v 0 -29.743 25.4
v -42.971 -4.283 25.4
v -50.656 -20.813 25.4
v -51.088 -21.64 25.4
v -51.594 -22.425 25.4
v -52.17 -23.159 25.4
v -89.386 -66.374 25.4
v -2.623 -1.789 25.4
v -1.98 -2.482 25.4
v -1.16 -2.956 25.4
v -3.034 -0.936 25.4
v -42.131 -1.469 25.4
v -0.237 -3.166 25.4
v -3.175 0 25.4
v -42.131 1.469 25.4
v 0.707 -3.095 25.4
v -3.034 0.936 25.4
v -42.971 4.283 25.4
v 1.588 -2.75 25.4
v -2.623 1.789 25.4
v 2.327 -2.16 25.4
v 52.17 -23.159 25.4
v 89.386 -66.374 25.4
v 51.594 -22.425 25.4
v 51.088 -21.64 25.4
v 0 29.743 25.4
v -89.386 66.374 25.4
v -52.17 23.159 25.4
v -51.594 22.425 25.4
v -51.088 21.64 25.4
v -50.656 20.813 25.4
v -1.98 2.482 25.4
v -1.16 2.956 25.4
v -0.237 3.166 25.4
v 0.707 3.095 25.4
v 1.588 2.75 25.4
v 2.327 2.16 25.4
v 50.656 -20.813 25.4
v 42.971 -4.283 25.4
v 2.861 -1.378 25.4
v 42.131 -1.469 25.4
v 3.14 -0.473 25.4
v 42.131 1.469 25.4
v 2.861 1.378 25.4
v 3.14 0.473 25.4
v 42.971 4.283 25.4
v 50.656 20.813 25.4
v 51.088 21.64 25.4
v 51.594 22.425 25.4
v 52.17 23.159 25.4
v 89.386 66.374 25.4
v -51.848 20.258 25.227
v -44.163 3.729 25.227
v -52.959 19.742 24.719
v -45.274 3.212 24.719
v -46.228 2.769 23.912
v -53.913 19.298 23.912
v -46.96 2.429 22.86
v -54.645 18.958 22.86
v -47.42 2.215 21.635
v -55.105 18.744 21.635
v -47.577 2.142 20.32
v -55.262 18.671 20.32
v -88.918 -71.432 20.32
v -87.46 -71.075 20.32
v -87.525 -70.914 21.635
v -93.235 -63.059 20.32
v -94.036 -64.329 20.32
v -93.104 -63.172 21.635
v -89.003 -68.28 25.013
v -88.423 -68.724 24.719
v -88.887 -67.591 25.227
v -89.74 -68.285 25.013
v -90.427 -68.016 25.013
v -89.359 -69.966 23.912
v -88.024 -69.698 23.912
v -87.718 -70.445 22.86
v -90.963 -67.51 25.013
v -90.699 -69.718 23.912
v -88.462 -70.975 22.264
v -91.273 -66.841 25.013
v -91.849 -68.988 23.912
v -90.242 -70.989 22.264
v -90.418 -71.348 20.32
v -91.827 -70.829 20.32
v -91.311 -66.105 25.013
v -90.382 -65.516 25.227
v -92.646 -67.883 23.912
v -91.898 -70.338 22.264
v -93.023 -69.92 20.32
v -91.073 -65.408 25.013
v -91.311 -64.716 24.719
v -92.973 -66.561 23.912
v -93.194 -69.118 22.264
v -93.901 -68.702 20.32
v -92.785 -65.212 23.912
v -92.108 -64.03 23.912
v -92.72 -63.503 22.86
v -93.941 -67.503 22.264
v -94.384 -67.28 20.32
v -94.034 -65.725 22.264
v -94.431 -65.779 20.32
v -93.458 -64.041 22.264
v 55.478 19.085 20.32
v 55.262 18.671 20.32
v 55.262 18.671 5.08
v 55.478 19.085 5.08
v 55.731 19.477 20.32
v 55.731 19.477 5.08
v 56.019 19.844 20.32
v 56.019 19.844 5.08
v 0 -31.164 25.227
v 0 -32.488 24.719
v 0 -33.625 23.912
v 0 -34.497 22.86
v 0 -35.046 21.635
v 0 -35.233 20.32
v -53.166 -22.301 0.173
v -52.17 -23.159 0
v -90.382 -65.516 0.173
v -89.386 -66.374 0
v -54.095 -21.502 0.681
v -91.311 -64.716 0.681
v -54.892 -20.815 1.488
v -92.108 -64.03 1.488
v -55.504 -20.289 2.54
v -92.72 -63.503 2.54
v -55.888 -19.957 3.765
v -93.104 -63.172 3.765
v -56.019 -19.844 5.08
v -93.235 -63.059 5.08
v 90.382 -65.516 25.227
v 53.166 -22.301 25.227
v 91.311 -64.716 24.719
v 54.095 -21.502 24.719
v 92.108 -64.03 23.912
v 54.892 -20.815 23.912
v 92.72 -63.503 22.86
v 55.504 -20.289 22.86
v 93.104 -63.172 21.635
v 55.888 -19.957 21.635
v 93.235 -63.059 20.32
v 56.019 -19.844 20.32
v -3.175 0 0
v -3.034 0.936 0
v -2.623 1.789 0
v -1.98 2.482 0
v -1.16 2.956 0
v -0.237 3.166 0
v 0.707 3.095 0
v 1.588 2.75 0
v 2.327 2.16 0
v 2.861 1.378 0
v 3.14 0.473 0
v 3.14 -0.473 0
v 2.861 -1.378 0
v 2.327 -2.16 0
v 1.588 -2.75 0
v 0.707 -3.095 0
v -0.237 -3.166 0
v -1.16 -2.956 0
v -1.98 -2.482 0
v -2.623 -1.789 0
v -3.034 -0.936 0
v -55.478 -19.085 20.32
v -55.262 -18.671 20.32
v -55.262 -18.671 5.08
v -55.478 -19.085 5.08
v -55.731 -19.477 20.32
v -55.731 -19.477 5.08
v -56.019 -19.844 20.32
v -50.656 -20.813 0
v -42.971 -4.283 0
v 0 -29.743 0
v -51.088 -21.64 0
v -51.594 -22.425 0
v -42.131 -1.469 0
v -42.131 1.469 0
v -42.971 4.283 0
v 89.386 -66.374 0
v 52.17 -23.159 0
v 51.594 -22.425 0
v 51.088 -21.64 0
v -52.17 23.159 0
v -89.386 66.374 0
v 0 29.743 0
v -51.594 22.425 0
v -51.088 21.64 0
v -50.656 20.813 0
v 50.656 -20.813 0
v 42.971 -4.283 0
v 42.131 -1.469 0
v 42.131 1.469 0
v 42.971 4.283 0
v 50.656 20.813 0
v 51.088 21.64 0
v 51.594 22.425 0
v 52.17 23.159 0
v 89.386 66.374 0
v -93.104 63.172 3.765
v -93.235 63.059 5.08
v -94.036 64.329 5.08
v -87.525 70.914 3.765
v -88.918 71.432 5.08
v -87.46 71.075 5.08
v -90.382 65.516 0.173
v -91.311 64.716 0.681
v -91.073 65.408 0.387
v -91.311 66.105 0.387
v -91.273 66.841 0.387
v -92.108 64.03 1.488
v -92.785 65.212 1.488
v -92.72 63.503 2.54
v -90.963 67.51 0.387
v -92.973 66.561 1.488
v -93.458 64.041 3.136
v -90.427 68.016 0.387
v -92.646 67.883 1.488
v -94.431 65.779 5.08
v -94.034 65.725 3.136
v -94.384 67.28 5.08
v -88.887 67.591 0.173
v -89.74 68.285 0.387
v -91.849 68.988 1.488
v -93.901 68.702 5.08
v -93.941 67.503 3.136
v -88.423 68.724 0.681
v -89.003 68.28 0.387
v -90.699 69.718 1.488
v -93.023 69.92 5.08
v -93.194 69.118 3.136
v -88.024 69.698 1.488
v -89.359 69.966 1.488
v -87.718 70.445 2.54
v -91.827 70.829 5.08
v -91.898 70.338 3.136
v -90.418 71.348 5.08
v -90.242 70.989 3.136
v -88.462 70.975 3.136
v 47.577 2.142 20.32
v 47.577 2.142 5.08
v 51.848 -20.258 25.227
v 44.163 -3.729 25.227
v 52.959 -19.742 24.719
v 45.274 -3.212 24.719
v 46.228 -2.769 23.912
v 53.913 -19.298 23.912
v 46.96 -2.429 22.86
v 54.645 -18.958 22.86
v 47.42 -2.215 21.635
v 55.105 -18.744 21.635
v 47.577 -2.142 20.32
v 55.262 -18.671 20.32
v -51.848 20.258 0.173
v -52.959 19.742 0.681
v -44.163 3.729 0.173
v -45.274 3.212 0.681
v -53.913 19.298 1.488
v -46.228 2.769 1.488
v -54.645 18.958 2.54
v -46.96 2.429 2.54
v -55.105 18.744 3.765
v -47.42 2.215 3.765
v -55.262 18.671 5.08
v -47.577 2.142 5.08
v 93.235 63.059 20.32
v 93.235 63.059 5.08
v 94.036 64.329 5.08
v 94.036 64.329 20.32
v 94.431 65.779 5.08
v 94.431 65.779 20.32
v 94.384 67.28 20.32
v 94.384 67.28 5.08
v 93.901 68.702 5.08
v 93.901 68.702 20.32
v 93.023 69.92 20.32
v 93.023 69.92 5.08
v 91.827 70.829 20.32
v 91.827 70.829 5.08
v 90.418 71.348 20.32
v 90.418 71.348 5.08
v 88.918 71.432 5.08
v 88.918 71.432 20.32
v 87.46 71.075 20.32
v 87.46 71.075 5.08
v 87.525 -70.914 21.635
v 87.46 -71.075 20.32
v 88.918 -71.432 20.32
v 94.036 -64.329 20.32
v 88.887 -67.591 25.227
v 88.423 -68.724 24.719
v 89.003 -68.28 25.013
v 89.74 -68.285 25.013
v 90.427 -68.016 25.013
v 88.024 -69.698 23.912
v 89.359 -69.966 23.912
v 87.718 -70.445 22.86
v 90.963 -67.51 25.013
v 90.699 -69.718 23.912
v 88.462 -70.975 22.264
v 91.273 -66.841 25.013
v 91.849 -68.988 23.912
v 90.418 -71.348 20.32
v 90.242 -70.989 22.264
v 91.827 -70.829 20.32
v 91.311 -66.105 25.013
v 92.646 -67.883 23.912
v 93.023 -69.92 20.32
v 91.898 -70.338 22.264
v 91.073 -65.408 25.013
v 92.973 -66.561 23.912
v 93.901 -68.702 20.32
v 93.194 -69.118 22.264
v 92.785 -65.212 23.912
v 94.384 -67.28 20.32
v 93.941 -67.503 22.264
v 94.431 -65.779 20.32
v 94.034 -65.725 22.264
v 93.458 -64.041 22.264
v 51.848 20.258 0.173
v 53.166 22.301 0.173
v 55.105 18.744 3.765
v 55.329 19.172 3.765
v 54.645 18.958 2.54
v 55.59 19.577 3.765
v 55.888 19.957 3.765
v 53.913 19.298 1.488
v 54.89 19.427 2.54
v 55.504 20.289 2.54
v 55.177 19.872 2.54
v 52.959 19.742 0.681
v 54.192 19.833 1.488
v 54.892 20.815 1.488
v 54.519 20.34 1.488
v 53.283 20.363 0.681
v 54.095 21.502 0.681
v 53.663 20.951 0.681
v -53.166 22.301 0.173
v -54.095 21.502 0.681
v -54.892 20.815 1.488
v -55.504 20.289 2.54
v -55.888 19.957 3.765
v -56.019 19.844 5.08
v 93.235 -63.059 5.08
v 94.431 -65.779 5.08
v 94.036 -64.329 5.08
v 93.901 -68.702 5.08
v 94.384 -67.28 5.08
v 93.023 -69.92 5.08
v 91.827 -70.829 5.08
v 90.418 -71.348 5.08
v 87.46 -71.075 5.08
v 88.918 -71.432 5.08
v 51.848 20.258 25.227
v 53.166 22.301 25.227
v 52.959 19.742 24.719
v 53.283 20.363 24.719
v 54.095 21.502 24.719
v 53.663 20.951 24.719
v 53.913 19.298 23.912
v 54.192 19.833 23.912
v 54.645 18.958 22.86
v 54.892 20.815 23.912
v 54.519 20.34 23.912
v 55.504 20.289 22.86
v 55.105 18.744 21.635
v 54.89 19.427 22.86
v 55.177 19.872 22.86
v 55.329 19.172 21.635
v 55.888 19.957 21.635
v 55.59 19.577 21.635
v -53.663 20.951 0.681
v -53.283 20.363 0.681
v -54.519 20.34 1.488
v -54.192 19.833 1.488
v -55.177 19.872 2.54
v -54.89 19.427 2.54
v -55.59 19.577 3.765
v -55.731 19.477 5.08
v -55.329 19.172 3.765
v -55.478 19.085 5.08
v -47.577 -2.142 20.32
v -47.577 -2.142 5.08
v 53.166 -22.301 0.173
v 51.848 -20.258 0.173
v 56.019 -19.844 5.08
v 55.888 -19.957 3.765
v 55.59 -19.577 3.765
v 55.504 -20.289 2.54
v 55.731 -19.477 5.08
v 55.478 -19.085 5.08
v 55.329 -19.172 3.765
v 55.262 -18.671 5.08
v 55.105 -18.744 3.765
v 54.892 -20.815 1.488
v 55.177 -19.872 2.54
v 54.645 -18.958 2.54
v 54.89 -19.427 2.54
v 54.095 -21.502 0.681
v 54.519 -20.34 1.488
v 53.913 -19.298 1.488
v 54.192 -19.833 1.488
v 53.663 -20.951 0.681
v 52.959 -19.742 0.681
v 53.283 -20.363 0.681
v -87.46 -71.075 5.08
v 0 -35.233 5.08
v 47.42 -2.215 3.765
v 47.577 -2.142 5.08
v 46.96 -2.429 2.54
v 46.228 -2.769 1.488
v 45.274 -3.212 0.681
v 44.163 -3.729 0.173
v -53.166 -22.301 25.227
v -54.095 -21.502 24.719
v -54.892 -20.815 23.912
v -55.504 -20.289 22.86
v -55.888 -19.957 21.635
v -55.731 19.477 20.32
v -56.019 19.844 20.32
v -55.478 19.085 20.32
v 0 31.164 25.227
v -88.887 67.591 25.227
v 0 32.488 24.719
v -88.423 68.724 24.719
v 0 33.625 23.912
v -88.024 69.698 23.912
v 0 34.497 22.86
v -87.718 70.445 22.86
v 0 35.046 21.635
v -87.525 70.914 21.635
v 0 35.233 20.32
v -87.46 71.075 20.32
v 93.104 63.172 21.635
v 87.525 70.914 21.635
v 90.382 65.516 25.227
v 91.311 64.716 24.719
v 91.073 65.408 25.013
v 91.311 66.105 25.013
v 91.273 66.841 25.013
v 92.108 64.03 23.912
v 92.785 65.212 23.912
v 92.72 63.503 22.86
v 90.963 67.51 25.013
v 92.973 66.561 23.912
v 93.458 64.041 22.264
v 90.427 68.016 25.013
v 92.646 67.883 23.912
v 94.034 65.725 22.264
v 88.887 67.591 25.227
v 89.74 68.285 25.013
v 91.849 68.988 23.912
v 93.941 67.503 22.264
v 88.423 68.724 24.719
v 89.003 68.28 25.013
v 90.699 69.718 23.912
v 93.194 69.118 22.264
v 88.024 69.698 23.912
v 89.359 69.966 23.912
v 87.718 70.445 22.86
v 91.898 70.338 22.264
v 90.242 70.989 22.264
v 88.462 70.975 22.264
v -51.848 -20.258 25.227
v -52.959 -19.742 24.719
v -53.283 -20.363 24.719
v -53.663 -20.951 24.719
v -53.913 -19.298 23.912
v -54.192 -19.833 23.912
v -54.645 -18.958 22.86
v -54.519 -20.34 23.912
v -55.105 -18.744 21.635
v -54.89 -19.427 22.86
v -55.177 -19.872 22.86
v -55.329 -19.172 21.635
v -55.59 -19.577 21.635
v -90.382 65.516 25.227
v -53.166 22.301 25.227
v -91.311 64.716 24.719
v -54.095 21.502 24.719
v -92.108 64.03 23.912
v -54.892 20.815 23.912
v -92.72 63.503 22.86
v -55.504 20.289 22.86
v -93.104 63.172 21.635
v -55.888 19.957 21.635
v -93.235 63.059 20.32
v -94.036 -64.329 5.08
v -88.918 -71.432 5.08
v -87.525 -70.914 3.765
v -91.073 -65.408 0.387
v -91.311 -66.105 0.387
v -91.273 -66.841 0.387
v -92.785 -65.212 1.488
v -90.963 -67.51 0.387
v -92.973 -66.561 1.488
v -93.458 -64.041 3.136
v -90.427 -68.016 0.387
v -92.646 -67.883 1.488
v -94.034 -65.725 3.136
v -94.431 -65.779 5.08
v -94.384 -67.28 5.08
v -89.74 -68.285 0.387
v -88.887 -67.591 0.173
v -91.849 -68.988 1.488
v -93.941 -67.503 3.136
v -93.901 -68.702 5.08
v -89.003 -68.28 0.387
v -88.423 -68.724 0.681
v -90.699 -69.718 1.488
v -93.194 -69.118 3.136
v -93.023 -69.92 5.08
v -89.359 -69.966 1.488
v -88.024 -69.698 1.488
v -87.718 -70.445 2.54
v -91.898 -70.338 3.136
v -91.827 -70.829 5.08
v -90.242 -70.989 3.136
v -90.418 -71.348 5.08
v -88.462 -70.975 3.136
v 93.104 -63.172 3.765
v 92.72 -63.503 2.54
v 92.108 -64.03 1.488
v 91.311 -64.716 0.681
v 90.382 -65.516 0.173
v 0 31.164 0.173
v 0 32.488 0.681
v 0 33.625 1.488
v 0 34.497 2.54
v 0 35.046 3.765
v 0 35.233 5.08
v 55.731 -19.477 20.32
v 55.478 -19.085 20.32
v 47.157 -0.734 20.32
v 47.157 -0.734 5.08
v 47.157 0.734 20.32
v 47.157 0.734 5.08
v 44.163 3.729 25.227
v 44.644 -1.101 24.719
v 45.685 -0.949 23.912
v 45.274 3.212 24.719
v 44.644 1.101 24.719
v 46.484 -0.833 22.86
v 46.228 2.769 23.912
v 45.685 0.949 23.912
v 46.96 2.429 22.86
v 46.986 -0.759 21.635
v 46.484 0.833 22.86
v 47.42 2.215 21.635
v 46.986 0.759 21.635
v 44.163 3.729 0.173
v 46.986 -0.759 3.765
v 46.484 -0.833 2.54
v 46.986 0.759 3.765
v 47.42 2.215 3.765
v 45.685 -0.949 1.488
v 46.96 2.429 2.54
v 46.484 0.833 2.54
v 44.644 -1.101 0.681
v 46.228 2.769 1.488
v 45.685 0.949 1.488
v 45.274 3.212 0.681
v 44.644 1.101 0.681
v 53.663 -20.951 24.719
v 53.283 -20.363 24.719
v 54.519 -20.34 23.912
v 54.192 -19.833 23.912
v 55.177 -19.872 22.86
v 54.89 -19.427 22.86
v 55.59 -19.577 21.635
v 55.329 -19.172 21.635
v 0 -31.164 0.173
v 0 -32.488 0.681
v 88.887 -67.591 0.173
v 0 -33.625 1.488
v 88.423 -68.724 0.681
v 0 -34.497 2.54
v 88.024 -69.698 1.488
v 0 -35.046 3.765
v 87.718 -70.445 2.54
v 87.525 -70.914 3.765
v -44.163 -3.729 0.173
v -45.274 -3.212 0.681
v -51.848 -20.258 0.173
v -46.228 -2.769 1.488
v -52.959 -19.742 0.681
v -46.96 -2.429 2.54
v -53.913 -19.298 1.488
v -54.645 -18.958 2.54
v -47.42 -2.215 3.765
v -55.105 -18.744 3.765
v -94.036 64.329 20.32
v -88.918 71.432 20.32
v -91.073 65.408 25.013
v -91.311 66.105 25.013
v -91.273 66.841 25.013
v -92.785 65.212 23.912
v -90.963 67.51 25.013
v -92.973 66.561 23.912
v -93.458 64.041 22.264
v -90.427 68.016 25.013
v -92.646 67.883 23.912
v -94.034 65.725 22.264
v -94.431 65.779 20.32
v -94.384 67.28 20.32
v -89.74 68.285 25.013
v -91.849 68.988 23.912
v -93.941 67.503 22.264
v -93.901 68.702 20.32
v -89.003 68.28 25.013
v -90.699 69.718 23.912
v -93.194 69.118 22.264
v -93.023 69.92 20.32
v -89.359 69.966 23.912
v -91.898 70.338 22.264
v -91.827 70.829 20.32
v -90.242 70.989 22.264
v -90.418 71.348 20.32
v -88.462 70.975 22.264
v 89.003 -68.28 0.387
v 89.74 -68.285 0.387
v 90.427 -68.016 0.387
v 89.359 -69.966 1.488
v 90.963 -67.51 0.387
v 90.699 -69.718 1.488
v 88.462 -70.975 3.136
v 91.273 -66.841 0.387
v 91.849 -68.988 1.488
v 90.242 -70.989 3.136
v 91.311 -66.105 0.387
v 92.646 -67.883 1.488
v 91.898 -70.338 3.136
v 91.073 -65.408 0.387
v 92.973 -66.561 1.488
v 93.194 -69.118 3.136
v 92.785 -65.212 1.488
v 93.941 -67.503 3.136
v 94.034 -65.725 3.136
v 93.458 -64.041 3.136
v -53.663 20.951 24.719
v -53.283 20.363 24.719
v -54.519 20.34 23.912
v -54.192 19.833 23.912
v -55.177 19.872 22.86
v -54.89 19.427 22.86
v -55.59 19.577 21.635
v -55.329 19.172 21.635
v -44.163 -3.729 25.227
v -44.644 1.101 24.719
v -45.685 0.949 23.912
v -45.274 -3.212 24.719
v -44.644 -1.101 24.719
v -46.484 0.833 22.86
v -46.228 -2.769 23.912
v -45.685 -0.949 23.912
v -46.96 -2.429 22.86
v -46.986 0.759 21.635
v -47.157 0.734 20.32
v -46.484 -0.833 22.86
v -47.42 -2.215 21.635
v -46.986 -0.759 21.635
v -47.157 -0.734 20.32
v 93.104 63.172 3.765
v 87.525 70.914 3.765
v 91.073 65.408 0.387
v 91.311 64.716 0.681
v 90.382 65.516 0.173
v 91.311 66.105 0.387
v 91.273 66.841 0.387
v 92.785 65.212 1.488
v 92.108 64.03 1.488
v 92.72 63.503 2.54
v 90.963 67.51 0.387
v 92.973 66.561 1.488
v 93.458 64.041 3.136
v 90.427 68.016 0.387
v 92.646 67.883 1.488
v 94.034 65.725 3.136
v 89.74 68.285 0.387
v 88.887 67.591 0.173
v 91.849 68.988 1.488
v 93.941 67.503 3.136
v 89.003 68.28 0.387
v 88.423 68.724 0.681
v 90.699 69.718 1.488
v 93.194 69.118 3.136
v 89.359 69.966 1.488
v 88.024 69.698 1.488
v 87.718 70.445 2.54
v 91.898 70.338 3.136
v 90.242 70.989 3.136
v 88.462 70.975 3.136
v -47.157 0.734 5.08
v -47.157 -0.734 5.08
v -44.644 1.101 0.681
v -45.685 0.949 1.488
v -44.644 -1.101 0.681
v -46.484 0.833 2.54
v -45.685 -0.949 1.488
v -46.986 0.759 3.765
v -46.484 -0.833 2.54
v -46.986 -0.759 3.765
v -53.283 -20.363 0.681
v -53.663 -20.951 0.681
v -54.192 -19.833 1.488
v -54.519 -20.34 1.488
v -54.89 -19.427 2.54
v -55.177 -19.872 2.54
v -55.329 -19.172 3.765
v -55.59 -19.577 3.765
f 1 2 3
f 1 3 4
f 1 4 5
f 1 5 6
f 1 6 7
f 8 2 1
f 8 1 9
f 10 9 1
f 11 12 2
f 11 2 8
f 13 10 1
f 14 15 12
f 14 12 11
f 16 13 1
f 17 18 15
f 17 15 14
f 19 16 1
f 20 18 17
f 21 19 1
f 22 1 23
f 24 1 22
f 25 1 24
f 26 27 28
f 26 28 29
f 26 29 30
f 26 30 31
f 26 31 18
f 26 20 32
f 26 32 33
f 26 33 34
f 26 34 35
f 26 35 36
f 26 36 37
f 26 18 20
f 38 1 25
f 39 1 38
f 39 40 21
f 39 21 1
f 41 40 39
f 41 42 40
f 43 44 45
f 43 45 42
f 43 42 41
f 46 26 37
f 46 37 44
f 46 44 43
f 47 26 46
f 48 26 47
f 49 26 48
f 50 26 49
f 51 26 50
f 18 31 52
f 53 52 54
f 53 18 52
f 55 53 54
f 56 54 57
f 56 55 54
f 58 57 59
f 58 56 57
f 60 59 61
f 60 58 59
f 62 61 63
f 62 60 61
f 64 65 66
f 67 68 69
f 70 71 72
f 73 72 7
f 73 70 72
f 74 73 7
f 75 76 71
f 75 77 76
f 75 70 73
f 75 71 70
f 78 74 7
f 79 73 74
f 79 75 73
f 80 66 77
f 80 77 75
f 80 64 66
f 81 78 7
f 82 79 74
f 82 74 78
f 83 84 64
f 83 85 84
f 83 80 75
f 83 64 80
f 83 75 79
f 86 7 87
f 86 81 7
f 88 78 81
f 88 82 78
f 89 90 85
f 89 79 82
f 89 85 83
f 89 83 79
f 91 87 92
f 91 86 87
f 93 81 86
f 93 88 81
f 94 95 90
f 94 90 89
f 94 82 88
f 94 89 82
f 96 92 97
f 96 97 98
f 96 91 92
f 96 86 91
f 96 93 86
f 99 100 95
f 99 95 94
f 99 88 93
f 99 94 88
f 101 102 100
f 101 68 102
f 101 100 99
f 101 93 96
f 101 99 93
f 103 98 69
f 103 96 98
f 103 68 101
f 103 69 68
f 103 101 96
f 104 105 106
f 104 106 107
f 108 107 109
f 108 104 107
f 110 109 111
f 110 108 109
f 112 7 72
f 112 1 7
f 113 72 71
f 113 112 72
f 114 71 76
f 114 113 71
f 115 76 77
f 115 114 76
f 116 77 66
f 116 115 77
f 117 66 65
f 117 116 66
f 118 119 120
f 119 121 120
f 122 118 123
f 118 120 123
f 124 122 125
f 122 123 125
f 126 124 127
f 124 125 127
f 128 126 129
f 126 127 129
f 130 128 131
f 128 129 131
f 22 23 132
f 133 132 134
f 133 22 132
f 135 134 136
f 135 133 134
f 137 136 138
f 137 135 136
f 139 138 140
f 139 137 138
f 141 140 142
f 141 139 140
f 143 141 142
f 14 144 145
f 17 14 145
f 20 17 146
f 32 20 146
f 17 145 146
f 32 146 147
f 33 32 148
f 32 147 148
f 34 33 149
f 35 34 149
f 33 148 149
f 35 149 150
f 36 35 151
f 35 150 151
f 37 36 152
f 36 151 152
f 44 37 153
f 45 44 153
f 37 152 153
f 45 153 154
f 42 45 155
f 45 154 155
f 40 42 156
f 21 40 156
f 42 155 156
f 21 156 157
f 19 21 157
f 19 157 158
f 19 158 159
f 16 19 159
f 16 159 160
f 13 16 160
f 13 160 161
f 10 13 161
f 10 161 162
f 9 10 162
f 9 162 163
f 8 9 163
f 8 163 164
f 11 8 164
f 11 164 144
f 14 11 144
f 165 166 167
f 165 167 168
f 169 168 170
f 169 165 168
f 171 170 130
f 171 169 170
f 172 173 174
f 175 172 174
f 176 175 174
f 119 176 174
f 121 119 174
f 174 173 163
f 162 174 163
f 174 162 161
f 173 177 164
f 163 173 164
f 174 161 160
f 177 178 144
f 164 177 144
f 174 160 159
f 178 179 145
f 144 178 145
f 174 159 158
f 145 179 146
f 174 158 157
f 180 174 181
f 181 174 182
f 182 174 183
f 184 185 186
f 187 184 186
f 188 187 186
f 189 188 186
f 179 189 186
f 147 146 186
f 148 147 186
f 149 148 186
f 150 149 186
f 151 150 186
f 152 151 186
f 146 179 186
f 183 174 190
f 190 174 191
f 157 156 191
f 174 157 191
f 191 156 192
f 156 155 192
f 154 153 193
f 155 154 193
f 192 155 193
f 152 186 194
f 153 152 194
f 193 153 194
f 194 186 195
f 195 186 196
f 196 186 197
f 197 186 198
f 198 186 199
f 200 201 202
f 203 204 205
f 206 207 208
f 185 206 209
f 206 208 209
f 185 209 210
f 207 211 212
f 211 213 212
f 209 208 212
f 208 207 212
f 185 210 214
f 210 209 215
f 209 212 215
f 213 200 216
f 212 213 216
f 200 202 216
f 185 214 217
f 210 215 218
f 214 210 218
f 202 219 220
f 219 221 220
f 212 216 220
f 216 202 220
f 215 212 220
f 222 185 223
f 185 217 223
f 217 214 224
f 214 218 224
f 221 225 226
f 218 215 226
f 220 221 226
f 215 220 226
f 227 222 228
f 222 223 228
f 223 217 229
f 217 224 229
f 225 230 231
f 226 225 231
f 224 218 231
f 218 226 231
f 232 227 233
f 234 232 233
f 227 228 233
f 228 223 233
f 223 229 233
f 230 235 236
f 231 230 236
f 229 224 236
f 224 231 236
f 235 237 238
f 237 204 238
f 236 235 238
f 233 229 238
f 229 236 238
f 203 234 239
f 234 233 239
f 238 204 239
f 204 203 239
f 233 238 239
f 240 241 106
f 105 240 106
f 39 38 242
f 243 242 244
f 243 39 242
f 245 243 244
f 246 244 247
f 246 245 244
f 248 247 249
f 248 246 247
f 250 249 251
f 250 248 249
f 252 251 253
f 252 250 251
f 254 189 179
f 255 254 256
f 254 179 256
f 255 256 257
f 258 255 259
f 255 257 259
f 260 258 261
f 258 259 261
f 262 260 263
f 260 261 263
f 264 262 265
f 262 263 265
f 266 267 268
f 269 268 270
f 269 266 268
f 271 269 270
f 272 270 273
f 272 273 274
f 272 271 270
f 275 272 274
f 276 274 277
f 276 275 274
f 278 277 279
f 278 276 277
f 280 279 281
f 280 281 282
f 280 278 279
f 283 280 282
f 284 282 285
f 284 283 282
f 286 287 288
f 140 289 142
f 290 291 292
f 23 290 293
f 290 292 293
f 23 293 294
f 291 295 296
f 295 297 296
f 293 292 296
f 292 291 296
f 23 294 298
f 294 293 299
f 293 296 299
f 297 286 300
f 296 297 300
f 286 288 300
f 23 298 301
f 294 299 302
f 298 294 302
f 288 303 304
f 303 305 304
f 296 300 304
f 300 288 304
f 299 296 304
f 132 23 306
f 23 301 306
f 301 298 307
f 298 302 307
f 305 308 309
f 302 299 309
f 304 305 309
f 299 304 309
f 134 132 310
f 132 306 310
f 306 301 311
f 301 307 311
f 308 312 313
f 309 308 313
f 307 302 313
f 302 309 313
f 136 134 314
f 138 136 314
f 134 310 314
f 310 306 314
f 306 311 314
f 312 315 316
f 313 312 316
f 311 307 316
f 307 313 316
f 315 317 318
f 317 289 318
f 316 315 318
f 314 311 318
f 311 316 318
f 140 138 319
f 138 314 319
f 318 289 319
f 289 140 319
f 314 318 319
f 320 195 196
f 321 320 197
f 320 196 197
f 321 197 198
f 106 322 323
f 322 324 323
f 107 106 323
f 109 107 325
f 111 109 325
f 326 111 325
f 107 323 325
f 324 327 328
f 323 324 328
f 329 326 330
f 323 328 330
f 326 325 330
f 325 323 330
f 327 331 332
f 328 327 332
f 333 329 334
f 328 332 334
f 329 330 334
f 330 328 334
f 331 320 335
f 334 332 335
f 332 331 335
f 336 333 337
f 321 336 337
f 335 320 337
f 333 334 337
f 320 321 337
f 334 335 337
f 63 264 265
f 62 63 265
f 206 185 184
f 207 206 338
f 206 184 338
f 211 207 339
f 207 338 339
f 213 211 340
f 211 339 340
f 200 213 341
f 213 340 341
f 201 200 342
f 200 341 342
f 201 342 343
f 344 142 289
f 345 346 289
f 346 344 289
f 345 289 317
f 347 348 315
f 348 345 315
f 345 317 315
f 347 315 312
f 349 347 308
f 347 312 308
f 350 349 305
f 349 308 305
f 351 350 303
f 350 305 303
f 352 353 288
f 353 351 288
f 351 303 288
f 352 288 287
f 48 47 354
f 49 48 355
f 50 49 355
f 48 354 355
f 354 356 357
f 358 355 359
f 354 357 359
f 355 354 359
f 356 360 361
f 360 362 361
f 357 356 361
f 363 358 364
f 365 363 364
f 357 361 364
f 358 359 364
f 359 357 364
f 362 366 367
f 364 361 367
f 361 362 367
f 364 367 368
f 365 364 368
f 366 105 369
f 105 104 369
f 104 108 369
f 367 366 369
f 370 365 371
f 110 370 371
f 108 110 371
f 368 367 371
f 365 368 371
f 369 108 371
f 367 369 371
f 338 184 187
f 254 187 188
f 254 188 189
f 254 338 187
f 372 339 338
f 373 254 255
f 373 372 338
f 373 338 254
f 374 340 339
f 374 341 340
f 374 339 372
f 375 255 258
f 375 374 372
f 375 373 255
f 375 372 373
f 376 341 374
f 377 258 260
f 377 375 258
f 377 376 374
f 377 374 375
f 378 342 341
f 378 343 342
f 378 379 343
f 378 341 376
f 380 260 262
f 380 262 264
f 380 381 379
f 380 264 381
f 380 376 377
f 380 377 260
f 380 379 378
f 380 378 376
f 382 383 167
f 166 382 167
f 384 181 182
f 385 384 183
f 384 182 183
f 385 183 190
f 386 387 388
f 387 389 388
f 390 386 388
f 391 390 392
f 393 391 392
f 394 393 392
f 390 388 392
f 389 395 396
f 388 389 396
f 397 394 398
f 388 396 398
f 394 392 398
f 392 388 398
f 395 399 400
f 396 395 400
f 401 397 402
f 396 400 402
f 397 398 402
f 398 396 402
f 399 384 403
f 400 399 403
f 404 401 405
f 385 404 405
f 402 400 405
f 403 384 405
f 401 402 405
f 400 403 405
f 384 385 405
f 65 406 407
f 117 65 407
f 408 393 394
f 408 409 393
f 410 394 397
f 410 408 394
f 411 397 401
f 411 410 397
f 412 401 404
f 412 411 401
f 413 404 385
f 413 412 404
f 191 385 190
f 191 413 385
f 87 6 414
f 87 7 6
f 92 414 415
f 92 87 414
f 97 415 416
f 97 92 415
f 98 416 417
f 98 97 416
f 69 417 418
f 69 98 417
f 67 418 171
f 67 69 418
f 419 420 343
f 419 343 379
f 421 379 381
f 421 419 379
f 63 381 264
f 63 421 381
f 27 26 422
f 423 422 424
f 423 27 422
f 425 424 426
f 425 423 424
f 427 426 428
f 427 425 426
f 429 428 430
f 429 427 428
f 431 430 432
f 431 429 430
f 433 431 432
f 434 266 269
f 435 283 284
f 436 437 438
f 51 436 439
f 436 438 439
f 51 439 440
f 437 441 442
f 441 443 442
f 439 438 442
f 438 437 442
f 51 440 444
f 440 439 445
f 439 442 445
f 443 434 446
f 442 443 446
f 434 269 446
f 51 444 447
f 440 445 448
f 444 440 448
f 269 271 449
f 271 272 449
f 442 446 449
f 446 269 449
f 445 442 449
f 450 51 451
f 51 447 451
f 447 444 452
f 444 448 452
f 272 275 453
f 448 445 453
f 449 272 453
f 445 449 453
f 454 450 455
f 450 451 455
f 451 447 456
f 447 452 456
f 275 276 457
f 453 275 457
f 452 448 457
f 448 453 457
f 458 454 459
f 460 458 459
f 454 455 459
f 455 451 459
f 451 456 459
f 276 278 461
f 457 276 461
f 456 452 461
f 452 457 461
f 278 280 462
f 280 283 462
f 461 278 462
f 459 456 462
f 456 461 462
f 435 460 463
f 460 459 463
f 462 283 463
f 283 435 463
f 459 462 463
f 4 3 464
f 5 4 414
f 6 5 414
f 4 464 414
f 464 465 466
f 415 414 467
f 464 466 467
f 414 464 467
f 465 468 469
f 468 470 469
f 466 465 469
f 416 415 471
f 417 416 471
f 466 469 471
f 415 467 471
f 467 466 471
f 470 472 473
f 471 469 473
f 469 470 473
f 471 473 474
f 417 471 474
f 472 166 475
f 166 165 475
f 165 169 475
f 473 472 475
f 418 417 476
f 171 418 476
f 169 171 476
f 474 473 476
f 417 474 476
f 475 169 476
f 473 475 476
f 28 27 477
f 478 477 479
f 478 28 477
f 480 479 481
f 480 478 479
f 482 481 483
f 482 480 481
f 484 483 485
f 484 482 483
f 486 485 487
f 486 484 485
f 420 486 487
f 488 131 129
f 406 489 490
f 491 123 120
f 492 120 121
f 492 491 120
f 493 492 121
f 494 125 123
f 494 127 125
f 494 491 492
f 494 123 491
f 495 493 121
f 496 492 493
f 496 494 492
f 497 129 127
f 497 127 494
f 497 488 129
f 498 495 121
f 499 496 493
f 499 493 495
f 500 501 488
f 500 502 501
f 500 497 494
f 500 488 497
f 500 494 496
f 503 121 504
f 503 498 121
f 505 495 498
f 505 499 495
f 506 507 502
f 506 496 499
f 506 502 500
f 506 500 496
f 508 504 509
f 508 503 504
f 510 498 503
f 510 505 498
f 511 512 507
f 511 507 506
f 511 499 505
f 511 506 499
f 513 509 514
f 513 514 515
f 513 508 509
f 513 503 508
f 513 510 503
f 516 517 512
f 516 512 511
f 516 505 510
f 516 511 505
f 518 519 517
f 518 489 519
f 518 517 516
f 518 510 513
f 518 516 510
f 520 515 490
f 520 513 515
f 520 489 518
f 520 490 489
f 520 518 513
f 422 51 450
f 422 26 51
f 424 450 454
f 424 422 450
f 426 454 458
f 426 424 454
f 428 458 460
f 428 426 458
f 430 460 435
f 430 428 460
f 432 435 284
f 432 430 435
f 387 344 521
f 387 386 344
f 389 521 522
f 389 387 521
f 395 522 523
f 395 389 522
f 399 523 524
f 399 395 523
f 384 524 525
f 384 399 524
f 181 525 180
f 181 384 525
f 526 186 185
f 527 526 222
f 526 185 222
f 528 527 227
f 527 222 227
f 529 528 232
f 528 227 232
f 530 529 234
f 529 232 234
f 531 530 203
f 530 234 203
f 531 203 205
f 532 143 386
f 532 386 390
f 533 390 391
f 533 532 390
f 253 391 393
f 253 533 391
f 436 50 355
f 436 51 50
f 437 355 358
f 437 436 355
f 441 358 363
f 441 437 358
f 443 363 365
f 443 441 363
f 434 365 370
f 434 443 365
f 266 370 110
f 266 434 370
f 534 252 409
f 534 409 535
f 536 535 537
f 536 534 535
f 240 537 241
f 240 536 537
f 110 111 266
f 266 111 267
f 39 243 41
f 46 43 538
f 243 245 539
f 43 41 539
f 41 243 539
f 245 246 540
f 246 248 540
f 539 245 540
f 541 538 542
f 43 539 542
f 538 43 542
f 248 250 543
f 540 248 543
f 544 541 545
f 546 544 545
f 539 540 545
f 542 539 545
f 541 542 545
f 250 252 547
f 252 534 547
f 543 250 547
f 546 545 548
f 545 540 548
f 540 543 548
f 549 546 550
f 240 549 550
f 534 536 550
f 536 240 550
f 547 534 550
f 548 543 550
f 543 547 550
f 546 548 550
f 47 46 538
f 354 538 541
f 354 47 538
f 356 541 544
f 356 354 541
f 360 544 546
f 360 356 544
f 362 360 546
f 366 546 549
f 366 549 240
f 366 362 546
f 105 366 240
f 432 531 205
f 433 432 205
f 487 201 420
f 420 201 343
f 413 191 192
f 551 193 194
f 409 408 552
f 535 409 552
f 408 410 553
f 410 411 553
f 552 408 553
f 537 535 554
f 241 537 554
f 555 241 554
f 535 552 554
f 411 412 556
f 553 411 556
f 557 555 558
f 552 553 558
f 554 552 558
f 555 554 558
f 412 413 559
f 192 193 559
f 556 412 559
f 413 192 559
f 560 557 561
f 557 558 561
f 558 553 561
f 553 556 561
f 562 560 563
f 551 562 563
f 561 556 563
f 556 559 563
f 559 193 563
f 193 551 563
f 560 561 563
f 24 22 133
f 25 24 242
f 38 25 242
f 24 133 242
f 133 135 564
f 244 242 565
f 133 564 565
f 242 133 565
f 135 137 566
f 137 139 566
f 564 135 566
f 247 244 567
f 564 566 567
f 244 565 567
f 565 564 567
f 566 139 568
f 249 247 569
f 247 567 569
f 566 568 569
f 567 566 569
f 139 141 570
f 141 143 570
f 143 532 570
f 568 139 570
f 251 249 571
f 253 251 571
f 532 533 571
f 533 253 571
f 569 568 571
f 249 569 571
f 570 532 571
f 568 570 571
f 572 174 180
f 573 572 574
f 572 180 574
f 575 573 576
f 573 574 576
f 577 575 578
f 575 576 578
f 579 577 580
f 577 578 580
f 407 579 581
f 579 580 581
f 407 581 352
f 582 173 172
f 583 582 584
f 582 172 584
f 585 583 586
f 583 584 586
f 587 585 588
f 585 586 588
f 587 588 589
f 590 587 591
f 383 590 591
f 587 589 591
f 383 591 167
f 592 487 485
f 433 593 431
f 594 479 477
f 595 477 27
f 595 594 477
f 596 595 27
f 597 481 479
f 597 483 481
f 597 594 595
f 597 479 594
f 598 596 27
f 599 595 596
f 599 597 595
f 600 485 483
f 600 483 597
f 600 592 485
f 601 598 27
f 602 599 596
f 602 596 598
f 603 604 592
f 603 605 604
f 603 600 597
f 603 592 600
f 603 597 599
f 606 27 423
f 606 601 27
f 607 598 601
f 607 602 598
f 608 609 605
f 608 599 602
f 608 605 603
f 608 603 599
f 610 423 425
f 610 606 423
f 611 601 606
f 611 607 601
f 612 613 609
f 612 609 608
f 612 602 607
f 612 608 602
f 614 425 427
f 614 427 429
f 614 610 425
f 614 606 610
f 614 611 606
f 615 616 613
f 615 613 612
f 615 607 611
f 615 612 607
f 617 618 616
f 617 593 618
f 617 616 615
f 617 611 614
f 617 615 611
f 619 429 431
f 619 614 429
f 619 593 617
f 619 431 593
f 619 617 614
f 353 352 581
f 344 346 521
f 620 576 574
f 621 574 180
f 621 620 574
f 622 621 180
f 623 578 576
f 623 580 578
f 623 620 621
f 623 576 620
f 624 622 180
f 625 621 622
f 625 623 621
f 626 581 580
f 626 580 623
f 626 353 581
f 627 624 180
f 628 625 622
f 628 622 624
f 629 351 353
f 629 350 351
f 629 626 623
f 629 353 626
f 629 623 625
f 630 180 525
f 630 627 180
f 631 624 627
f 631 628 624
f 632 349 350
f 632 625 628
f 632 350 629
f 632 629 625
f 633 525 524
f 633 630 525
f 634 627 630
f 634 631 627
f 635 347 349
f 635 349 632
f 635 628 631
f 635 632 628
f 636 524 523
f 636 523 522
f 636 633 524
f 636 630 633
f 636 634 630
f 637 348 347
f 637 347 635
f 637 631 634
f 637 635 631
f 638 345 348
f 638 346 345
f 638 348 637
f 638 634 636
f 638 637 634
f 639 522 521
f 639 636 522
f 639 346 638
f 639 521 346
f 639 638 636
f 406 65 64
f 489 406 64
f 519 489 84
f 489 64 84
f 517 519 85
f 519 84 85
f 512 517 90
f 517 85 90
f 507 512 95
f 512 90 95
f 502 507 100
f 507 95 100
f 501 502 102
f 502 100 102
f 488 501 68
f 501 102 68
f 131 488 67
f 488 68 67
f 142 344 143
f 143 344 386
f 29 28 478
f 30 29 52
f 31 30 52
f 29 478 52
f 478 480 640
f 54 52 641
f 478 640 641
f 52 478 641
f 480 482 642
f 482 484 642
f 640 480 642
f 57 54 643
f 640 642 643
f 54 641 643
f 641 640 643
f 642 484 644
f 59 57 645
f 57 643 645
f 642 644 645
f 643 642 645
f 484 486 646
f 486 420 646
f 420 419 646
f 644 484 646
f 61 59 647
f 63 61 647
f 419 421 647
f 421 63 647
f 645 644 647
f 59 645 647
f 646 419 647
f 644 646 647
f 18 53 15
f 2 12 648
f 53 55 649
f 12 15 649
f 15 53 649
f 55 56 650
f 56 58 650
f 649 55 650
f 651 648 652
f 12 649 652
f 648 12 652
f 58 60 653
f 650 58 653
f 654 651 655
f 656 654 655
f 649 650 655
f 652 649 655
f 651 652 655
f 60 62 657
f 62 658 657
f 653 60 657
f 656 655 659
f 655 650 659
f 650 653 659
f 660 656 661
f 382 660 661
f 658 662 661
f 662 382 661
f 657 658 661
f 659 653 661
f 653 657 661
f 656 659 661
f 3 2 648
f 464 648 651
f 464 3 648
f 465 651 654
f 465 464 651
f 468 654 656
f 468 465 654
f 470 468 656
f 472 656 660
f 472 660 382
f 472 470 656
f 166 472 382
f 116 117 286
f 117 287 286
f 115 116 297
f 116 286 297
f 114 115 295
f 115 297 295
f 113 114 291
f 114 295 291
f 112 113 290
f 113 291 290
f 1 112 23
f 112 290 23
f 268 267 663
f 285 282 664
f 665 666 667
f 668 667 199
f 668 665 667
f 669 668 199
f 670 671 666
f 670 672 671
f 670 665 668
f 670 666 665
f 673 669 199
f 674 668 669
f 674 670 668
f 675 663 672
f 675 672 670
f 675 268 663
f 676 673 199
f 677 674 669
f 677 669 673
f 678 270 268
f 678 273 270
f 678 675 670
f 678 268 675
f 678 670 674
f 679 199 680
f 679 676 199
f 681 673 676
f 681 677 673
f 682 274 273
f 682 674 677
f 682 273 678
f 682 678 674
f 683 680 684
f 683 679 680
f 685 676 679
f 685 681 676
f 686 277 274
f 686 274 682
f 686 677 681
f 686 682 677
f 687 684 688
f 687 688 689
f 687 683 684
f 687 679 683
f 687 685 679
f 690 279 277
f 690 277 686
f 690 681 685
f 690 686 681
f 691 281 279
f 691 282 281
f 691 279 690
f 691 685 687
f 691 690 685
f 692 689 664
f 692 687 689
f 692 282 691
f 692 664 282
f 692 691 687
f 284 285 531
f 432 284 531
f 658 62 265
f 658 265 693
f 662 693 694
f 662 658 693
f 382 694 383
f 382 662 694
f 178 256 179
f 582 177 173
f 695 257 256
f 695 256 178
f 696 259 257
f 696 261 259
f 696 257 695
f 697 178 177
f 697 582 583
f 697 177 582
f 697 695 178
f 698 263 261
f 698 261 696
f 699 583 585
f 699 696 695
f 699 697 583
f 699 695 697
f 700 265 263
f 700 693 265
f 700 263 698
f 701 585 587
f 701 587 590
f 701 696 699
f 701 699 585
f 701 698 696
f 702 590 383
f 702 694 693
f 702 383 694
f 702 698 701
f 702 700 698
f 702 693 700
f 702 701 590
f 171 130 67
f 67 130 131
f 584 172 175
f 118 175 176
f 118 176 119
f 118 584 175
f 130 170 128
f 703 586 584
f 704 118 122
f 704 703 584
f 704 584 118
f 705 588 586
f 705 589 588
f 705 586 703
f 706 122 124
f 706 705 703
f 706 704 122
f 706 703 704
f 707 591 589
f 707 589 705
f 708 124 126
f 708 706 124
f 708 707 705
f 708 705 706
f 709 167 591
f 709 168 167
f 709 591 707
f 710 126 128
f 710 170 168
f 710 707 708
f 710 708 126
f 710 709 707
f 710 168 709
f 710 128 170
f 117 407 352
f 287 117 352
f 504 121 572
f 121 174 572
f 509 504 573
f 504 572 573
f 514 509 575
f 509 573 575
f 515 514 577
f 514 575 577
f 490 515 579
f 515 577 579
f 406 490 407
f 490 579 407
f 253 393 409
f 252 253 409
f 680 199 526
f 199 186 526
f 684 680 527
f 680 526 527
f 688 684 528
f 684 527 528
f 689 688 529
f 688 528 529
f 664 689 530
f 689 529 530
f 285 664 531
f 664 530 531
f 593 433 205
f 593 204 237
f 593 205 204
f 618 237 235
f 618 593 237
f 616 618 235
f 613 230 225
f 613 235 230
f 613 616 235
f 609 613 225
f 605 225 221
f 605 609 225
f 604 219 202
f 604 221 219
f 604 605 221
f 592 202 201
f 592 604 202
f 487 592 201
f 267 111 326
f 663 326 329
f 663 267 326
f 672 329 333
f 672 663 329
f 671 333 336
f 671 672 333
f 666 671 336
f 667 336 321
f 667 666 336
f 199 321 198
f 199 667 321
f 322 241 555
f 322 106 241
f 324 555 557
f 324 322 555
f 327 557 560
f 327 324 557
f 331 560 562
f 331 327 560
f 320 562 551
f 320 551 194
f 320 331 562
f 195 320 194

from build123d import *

# Parameters (mm, degrees)
F2_DEPTH = 25.4
F3_F1_R  = 5.08
F3_F2_R  = 5.08
F6_D     = 6.35


# Not quite as in the source:
# - the program builds the solid bodies; features that only make, move or delete a surface that nothing else refers to are left out


with BuildPart() as f2:
    # F1 (on Top) → F2 (new body)
    with BuildSketch(Plane.XY):
        Polygon((-107.0532500744, -79.1042298079), (0, -35.2327227592), (107.0532500744, -79.1042298079), (55.5592626333, -19.3102359772), (46.5817004442, 0), (55.5592626333, 19.3102359772), (107.0532500744, 79.1042298079), (0, 35.2327227592), (-107.0532500744, 79.1042298079), (-55.5592626333, 19.3102359772), (-46.5817004442, 0), (-55.5592626333, -19.3102359772), align=None)
    extrude(amount=F2_DEPTH)

    # F3: fillet of radius 5.08 on 32 edges, made by hand

    # F3_f1
    f3_f1_edges = [f2.edges().sort_by_distance(p)[0] for p in [
        (-55.5592626333, -19.3102359772, 12.7),
        (-46.5817004442, 0, 12.7),
        (-55.5592626333, 19.3102359772, 12.7),
        (55.5592626333, -19.3102359772, 12.7),
        (46.5817004442, 0, 12.7),
        (55.5592626333, 19.3102359772, 12.7),
    ]]
    fillet(f3_f1_edges, radius=F3_F1_R)

    # F3_f2
    f3_f2_edges = [f2.edges().sort_by_distance(p)[0] for p in [
        (53.5266250372, 57.1684762836, 25.4),
        (53.5266250372, 57.1684762836, 0),
        (107.0532500744, 79.1042298079, 12.7),
        (81.5362590314, 49.4743083195, 25.4),
        (51.4197227557, 10.4063163842, 25.4),
        (51.4197227557, -10.4063163842, 25.4),
        (81.5362590314, -49.4743083195, 25.4),
        (107.0532500744, -79.1042298079, 12.7),
        (53.5266250372, -57.1684762836, 0),
        (53.5266250372, -57.1684762836, 25.4),
        (-81.5362590314, 49.4743083195, 25.4),
        (-53.5266250372, 57.1684762836, 25.4),
        (-51.4197227557, 10.4063163842, 25.4),
        (-51.4197227557, -10.4063163842, 25.4),
        (-81.5362590314, -49.4743083195, 25.4),
        (-53.5266250372, 57.1684762836, 0),
        (-107.0532500744, 79.1042298079, 12.7),
        (-81.5362590314, 49.4743083195, 0),
        (-53.5266250372, -57.1684762836, 0),
        (-107.0532500744, -79.1042298079, 12.7),
        (-53.5266250372, -57.1684762836, 25.4),
        (81.5362590314, -49.4743083195, 0),
        (51.4197227557, -10.4063163842, 0),
        (51.4197227557, 10.4063163842, 0),
        (-51.4197227557, 10.4063163842, 0),
        (-51.4197227557, -10.4063163842, 0),
        (-47.1038678133, 0, 0),
        (-55.6001625442, -19.2838429205, 0),
        (-55.6001625442, 19.2838429205, 0),
        (47.1038678133, 0, 0),
        (55.6001625442, 19.2838429205, 0),
        (55.6001625442, -19.2838429205, 0),
        (-55.6001625442, -19.2838429205, 25.4),
        (-47.1038678133, 0, 25.4),
        (-55.6001625442, 19.2838429205, 25.4),
        (55.6001625442, -19.2838429205, 25.4),
        (47.1038678133, 0, 25.4),
        (55.6001625442, 19.2838429205, 25.4),
    ]]
    fillet(f3_f2_edges, radius=F3_F2_R)

    # F6 (through all)
    with Locations(Plane.XY.offset(25.4)):
        with Locations((0, 0)):
            Hole(F6_D / 2)


solid = f2.part
